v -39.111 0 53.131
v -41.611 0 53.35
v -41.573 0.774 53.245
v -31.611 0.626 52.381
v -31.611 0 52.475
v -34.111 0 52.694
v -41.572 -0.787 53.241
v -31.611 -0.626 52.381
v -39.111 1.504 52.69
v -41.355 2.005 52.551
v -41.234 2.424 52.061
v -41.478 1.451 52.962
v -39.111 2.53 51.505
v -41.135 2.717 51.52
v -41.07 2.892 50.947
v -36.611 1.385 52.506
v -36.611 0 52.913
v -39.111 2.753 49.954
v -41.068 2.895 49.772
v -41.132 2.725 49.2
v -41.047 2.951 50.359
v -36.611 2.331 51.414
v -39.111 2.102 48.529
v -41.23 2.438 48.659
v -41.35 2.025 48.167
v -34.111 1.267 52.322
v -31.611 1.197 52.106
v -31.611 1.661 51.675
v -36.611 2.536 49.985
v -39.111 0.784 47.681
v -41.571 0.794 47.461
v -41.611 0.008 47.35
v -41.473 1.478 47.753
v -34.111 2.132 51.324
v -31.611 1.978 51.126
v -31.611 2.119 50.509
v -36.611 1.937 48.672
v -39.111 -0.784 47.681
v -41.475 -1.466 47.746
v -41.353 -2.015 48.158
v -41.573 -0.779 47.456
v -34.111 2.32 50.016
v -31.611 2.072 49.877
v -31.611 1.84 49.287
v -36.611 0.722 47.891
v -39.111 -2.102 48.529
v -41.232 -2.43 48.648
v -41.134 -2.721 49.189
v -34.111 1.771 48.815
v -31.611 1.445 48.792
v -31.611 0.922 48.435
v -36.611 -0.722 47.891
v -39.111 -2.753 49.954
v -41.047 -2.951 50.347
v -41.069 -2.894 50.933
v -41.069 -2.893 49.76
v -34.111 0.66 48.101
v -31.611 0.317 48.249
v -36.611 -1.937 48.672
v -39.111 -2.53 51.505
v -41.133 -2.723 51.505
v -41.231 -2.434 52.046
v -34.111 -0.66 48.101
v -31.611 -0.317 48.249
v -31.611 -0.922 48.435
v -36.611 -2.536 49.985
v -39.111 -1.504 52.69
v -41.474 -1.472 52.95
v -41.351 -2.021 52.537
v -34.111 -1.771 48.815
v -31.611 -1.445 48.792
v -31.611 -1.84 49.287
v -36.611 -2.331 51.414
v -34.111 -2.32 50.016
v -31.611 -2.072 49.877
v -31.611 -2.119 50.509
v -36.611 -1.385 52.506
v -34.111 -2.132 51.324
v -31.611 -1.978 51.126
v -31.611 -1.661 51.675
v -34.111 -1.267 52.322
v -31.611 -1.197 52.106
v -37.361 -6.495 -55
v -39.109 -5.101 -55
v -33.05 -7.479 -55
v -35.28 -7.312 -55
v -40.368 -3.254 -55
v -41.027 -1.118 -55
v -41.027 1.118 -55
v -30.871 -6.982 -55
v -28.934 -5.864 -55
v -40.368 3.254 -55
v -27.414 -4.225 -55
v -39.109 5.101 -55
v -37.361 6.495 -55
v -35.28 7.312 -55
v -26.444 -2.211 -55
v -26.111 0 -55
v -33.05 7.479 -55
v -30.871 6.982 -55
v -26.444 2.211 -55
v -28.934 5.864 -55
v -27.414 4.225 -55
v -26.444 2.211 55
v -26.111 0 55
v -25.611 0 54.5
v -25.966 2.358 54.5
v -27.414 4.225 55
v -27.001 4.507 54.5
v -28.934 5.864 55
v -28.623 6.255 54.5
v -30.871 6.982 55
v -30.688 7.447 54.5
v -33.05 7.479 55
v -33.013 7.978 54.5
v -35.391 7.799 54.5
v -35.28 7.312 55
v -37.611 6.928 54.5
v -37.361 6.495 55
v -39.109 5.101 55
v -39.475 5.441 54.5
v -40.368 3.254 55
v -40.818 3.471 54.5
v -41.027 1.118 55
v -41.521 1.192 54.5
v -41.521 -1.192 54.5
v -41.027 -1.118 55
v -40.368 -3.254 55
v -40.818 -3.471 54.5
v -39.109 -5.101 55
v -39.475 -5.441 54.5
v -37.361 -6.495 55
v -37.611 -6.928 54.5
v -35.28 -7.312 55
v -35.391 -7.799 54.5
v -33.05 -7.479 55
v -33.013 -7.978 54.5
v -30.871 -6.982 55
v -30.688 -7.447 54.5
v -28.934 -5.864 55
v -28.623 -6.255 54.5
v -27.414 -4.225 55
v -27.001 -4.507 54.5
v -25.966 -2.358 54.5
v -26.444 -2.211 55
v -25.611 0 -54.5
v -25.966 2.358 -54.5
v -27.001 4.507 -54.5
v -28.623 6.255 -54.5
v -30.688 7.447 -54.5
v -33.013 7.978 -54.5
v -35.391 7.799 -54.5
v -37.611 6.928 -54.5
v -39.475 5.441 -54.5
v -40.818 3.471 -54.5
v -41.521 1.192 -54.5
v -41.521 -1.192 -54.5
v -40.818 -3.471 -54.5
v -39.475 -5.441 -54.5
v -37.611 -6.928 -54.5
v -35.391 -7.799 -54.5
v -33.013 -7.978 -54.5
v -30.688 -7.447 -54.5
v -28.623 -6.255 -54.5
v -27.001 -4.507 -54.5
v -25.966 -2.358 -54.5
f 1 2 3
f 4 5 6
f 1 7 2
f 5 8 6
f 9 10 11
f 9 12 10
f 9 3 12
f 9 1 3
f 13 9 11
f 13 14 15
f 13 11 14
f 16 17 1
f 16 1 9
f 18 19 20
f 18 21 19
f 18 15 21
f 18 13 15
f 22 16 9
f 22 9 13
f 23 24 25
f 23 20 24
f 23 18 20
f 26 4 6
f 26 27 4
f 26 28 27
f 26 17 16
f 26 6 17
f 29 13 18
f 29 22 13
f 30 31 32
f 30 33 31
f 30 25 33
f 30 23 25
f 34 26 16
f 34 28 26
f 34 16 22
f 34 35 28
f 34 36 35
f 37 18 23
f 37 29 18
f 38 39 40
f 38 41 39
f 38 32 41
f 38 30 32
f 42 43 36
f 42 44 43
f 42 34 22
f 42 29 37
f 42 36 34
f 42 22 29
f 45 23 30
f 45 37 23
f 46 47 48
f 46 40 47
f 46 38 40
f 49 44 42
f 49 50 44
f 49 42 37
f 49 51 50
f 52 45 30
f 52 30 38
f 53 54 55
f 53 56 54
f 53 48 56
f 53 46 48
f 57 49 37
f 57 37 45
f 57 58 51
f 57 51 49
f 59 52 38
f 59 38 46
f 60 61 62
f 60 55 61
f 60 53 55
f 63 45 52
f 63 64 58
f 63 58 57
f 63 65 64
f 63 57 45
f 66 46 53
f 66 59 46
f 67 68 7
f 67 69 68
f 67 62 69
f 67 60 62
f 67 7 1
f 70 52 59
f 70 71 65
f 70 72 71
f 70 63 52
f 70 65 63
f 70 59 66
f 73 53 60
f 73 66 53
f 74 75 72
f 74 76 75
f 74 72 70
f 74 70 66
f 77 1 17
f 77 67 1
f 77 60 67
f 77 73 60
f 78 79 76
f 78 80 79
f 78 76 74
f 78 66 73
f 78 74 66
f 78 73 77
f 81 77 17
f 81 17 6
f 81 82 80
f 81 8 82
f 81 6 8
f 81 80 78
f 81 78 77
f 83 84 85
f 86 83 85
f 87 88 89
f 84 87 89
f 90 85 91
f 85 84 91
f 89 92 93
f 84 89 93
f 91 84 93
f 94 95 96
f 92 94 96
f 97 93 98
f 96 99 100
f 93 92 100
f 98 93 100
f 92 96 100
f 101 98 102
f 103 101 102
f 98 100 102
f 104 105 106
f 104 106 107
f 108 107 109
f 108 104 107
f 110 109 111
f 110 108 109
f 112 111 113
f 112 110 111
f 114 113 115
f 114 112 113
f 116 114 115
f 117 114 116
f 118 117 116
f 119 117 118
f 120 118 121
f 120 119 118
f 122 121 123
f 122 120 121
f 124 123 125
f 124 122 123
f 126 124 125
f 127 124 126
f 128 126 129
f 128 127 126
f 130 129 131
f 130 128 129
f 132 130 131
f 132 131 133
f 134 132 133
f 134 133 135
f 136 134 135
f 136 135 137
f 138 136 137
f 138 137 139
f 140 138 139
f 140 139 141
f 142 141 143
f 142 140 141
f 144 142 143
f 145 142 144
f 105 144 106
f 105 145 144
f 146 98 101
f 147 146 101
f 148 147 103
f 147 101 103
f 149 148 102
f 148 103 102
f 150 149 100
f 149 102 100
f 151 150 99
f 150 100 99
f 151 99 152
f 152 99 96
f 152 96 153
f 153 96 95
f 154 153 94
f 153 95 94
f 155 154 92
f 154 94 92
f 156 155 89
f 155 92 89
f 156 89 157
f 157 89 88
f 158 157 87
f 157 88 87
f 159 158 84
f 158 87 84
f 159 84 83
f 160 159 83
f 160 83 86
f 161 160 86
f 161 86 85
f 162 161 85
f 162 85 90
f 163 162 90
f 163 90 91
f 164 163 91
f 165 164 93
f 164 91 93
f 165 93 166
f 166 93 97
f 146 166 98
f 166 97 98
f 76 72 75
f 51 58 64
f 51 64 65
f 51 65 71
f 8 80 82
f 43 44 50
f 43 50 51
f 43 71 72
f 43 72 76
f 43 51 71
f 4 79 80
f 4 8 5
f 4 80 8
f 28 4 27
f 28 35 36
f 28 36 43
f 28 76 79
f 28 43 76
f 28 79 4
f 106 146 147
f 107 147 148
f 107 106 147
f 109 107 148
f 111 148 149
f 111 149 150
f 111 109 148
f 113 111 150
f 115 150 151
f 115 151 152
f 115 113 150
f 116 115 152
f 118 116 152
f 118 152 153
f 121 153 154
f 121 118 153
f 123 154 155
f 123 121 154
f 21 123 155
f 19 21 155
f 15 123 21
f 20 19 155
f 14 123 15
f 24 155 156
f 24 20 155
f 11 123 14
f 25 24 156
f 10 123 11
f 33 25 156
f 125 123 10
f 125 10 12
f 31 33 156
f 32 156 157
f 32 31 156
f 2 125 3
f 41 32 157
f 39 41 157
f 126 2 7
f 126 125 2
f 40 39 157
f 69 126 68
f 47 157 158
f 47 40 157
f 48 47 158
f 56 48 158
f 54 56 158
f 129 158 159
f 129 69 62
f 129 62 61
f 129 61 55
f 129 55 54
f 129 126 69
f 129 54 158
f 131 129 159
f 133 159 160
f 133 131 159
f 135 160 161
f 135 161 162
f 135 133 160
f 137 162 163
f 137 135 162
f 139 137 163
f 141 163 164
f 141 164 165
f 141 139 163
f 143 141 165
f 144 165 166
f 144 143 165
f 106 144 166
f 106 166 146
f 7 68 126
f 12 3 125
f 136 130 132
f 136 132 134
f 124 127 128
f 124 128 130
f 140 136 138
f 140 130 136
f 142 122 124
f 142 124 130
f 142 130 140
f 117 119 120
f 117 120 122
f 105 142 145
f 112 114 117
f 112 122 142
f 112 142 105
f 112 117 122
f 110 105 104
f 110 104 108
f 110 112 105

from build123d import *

# Parameters (mm, degrees)
SZKIC1_R                    = 8
DODANIE_WYCI_GNI_CIE1_DEPTH = 55
SFAZOWANIE1_SIZE            = 0.5
SZKIC2_R                    = 3
WYTNIJ_WYCI_GNI_CIE1_DEPTH  = 10
WYTNIJ_WYCI_GNI_CIE1_TAPER  = 5


with BuildPart() as part:
    # Szkic1 → Dodanie-wyciągnięcie1 (new body, symmetric)
    with BuildSketch(Plane.XY):
        with Locations((-33.610628805, 0)):
            Circle(SZKIC1_R)
    extrude(amount=DODANIE_WYCI_GNI_CIE1_DEPTH, both=True)

    # Sfazowanie1
    sfazowanie1_edges = [part.edges().sort_by_distance(p)[0] for p in [
        (-41.610628805, 0, -55),
        (-41.610628805, 0, 55),
    ]]
    chamfer(sfazowanie1_edges, length=SFAZOWANIE1_SIZE)

    # Szkic2 → Wytnij-wyciągnięcie1 (cut)
    with BuildSketch(Plane.ZY.offset(41.610628805)):
        with Locations((50.349966255, 0)):
            Circle(SZKIC2_R)
    extrude(amount=-WYTNIJ_WYCI_GNI_CIE1_DEPTH, taper=WYTNIJ_WYCI_GNI_CIE1_TAPER, mode=Mode.SUBTRACT)


solid = part.part
